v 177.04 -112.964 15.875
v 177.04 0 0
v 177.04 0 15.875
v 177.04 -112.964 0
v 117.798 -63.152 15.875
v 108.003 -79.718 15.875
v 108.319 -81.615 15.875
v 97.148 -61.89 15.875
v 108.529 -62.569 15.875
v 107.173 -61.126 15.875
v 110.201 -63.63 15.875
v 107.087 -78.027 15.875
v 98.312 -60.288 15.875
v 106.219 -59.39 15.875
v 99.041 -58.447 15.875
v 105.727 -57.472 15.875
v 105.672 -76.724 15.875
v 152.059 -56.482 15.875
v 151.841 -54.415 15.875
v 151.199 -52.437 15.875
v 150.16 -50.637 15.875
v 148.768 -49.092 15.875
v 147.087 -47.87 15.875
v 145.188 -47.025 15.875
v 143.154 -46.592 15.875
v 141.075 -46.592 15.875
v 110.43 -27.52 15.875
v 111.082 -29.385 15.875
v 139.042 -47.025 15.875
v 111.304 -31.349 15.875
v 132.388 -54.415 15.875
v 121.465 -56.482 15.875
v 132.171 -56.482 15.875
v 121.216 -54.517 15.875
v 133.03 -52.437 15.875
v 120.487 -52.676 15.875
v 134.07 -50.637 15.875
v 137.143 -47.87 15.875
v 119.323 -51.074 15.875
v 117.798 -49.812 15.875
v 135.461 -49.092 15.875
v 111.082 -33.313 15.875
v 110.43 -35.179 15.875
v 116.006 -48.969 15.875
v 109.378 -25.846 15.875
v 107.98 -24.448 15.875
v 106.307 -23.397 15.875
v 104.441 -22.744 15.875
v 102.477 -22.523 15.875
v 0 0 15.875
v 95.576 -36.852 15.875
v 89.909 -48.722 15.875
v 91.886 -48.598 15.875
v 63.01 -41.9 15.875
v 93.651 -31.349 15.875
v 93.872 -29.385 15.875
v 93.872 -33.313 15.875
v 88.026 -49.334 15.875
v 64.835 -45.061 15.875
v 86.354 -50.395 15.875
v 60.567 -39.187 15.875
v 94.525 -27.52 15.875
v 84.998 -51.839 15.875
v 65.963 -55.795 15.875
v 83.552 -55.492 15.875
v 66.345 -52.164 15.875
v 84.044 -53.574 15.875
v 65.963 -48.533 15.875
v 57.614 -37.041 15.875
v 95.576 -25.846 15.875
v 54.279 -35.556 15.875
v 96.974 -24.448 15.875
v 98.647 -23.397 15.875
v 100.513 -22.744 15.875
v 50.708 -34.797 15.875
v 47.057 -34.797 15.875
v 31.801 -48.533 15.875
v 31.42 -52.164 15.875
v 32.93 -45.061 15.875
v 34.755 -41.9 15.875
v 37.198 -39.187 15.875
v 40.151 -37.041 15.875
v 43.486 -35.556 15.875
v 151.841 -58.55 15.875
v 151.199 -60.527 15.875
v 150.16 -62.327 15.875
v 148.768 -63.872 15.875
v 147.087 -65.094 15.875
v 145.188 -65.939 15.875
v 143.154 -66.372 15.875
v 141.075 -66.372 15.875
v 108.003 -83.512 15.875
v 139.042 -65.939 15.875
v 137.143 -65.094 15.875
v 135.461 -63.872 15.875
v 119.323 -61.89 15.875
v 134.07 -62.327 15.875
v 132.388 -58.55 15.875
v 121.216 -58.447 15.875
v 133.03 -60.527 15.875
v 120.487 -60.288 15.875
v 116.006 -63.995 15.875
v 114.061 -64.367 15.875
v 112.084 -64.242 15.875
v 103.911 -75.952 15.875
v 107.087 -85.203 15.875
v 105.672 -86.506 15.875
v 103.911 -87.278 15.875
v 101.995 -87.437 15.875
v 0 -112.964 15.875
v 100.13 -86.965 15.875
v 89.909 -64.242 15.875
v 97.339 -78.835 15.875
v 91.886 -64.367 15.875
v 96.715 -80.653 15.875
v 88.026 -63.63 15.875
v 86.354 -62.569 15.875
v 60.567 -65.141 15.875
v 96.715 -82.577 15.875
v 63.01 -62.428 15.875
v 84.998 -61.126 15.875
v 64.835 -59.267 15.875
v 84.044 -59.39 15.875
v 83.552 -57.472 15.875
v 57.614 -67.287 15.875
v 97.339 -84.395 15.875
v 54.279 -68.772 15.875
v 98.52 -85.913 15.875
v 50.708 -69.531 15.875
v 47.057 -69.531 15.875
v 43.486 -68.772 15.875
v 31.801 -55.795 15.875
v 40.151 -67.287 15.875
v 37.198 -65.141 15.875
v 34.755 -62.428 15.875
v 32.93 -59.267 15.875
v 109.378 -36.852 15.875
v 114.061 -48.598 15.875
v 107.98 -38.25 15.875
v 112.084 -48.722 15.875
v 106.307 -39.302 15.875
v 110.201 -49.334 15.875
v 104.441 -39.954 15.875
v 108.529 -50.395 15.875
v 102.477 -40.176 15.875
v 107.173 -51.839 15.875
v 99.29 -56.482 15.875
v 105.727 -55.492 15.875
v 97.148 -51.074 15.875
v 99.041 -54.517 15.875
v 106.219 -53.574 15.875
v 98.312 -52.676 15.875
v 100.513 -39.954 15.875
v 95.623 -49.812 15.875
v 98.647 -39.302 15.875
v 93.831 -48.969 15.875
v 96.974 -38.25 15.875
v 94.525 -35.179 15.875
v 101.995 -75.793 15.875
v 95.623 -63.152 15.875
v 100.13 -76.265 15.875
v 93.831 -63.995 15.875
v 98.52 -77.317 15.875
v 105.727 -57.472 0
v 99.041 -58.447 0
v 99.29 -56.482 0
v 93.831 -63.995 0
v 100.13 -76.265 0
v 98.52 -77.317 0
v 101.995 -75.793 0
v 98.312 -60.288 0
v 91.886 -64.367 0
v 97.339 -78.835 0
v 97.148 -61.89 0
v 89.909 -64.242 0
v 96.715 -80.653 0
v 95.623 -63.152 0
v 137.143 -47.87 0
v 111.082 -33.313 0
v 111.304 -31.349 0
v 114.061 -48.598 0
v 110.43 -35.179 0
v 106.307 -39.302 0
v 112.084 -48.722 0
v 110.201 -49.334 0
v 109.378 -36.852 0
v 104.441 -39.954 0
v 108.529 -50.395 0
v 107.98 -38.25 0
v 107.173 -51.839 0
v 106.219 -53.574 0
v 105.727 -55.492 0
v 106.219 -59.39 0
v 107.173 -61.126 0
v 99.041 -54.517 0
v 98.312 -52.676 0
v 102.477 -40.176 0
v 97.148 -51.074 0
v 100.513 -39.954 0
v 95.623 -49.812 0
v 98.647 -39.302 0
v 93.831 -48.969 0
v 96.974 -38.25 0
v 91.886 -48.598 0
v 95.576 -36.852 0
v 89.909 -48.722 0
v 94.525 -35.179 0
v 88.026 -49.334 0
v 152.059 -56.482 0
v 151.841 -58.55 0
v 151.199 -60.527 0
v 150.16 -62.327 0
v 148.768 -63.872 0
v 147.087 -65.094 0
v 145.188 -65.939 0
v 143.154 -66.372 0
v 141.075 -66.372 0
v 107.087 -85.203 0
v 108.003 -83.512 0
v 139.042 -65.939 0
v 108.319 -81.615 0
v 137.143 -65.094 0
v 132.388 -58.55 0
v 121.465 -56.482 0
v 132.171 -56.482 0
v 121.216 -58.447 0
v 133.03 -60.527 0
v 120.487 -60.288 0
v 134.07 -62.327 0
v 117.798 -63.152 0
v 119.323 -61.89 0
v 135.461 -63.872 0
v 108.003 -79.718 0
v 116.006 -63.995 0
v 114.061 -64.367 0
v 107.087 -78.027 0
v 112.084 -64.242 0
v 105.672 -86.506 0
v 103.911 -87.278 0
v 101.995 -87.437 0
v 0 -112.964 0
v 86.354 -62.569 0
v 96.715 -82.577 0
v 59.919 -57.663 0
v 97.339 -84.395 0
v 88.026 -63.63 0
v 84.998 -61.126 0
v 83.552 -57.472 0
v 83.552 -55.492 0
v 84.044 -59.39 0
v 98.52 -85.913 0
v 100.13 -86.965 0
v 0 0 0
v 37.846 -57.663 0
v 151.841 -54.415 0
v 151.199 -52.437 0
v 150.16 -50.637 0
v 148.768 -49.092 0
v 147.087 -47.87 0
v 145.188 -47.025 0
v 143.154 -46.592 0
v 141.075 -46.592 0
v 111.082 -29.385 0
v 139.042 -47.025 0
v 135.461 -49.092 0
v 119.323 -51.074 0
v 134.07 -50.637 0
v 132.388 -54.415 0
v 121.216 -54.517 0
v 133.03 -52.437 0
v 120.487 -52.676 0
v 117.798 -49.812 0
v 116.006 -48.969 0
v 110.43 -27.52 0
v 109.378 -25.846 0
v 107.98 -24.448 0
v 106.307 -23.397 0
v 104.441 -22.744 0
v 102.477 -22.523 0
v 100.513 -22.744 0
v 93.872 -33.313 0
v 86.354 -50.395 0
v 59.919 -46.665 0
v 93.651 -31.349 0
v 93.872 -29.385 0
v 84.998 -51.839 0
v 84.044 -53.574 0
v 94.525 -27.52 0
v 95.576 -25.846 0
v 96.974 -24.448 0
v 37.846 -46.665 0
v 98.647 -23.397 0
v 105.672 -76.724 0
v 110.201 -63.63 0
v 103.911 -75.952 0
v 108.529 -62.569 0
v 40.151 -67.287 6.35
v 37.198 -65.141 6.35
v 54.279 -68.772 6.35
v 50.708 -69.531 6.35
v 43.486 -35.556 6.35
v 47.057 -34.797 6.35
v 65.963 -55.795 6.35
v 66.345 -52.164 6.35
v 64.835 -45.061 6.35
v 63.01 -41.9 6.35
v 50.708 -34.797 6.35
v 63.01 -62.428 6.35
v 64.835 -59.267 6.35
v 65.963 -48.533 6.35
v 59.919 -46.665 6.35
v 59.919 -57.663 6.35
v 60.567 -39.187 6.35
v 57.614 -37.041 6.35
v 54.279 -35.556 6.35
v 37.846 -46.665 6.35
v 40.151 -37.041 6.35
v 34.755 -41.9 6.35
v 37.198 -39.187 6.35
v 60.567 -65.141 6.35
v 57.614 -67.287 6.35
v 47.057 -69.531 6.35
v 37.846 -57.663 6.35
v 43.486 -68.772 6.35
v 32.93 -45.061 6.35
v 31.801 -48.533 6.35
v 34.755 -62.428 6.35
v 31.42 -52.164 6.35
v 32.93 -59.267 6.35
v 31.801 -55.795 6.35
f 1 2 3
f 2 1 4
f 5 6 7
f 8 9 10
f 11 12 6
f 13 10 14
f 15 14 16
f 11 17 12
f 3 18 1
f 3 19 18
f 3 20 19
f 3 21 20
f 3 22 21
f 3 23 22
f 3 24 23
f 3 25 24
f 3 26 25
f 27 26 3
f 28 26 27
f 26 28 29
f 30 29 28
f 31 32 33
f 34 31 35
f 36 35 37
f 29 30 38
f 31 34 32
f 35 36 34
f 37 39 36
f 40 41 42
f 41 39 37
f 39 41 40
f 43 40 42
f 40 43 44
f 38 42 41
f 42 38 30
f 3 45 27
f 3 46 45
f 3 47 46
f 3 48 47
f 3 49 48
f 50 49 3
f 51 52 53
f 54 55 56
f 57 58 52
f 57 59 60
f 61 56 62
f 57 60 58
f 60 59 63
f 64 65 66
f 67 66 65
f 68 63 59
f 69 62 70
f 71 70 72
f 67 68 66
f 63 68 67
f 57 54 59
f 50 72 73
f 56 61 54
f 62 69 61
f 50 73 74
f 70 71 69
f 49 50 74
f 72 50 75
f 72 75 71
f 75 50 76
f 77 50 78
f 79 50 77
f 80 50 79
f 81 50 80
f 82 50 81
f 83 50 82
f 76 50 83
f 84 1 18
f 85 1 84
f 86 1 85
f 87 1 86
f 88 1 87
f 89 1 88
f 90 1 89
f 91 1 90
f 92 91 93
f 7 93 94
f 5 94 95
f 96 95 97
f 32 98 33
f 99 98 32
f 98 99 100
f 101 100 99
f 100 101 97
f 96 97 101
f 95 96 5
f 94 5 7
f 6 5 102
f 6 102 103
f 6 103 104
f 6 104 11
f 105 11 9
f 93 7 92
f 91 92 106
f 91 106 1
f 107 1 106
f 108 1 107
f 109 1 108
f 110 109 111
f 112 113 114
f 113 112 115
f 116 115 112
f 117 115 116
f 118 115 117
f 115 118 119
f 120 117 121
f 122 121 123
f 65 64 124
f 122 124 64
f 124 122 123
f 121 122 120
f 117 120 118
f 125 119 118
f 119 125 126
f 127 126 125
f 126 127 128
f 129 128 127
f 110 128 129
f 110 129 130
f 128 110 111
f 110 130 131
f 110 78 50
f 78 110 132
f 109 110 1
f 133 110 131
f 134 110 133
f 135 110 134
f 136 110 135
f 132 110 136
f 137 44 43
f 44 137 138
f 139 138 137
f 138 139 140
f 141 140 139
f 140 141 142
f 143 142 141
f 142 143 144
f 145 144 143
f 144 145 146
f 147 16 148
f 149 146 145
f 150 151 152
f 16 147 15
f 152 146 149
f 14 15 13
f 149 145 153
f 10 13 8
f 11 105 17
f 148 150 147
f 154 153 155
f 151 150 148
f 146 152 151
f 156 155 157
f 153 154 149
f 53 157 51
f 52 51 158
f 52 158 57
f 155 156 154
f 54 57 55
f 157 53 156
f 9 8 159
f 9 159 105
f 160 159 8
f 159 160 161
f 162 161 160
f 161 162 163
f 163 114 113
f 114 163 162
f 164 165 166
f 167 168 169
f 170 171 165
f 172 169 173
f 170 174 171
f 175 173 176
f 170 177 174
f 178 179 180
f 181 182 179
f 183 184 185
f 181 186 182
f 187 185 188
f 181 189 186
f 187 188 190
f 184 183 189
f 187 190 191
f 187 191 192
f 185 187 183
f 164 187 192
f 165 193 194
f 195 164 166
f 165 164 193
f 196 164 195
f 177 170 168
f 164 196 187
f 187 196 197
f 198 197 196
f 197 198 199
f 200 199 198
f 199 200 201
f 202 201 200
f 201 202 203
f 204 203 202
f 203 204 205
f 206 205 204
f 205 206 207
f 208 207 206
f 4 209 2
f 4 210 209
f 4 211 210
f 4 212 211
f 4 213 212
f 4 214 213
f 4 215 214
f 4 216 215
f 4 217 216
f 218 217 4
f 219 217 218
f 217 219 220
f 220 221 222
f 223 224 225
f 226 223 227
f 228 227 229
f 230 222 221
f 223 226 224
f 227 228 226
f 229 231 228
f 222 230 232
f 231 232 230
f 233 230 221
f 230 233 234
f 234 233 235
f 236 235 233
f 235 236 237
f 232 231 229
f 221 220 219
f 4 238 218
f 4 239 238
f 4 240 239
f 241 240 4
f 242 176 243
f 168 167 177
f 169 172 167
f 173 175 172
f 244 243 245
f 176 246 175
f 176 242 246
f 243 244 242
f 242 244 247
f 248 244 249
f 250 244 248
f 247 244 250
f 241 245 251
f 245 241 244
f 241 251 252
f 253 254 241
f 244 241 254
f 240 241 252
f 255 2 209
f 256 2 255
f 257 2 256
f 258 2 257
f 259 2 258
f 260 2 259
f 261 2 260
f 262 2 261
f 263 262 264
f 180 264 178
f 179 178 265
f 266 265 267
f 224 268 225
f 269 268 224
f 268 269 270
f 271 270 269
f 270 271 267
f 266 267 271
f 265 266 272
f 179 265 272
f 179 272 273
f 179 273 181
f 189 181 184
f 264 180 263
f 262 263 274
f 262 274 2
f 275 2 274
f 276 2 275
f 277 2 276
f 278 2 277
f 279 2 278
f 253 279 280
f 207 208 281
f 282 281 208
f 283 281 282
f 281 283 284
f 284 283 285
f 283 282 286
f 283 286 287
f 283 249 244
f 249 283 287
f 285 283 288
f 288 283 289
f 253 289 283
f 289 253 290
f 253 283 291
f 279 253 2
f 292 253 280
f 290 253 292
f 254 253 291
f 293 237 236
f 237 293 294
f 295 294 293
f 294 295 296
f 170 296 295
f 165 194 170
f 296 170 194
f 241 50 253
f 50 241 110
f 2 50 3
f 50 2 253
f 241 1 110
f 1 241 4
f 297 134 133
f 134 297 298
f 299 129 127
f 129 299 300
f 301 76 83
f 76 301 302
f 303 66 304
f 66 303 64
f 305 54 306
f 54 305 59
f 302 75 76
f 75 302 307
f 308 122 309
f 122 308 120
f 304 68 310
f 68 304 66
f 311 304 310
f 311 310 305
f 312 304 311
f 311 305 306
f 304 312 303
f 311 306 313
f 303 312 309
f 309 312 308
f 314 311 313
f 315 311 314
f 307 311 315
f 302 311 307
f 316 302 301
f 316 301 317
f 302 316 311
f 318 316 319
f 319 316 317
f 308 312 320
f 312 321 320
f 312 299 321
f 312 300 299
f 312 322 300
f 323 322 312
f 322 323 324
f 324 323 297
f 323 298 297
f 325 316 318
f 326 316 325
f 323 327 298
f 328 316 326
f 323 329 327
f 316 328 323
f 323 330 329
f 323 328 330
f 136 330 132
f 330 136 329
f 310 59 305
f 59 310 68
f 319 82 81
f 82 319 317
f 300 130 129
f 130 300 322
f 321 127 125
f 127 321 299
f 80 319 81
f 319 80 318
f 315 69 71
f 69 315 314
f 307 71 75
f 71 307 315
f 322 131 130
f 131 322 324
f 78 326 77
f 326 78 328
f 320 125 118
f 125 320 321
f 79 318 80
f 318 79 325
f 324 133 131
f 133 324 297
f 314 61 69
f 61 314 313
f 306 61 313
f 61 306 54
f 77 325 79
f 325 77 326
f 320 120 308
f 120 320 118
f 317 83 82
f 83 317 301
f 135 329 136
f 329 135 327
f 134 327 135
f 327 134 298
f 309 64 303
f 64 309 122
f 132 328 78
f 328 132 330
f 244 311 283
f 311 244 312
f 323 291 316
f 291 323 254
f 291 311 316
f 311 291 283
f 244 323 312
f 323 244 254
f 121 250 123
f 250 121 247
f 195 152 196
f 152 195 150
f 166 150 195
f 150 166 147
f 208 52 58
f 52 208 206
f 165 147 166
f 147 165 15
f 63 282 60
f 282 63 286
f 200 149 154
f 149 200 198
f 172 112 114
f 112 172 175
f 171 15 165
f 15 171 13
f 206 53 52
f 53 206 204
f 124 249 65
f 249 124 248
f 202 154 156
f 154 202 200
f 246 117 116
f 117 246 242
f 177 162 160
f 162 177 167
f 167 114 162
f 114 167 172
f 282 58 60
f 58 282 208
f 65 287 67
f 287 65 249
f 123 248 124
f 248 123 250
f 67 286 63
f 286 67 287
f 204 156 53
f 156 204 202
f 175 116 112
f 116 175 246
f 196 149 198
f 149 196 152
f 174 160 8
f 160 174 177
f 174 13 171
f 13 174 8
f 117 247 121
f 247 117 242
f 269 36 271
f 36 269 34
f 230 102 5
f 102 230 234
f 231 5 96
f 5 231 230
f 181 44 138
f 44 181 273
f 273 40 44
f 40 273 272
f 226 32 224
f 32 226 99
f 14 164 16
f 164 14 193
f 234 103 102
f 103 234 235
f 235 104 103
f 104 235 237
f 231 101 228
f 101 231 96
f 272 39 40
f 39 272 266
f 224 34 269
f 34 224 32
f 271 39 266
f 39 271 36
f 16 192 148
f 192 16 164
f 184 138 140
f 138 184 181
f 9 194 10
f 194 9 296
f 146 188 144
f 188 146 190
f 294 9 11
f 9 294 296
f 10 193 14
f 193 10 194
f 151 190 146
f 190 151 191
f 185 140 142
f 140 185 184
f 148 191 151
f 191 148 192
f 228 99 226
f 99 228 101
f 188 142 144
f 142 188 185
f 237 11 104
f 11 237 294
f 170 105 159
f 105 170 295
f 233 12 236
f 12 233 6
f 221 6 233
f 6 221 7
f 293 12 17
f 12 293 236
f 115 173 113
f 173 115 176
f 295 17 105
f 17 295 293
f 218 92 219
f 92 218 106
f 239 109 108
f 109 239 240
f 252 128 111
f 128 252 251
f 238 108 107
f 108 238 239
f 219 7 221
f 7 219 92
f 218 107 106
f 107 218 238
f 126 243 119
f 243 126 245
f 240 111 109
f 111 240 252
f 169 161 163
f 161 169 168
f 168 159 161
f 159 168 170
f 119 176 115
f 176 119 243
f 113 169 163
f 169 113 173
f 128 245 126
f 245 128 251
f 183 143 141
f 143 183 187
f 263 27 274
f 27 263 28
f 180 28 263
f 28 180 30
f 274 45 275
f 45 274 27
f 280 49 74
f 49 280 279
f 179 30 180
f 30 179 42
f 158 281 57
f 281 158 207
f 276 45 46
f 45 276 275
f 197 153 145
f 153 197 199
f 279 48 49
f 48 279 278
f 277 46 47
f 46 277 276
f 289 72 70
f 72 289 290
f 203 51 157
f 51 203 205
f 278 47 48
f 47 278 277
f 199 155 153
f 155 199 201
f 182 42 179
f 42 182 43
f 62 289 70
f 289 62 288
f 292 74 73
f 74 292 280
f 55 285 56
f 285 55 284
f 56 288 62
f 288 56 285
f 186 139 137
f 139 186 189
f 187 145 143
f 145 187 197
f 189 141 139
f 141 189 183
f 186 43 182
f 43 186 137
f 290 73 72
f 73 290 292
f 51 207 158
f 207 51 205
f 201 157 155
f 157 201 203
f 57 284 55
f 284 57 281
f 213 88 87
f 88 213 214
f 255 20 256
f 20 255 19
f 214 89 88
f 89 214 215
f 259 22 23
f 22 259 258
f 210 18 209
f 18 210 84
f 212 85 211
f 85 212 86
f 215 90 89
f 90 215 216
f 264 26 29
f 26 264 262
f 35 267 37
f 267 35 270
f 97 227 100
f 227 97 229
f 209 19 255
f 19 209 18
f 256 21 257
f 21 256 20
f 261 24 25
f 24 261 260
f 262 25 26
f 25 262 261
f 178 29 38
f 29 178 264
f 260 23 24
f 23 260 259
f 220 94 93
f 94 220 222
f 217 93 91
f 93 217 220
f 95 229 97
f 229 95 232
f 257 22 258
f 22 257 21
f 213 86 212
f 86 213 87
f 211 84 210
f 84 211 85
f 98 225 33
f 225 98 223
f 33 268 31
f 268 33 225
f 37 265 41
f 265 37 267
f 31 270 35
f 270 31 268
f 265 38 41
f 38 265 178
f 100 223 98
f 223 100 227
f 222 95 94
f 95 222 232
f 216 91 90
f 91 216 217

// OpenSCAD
inch = 25.4;
oak_thickness = 5/8*inch;
component_gutter = 1/8*inch;

control_board_width = 2.349*inch;
control_board_height = 2.727*inch;
control_board_thickness = 0.068*inch;
segment_distance_from_top = 0.977*inch;
segment_height = 0.433*inch;
segment_gutter = 0.01*inch;
segment_width = (0.869*inch - 2*segment_gutter)/3;
segment_depth = 0.195*inch;

button_diameter = 19;
button_hole_diameter = 15.8;
iron_bracket_width = 1.25*inch;

top_angle = 10;
top_angle_adjust = oak_thickness * tan(top_angle);
top_width = 
  oak_thickness +
  component_gutter +
  control_board_width +
  component_gutter +
  button_diameter +
  component_gutter +
  button_diameter +
  component_gutter +
  iron_bracket_width +
  component_gutter +
  oak_thickness;
top_height =
  top_angle_adjust +
  oak_thickness +
  component_gutter +
  control_board_height +
  component_gutter +
  oak_thickness +
  top_angle_adjust;

component_x = function(grid_pos)
  let (
    x_offset = oak_thickness +
      component_gutter +
      control_board_width +
      component_gutter +
      button_diameter/2,
    x_spacing = button_diameter + component_gutter
  )
  x_offset + grid_pos * x_spacing;
component_y = function(grid_pos)
  let (
    y_offset = -(top_angle_adjust + oak_thickness + component_gutter +  button_diameter/2),
    y_space = control_board_height - button_diameter,
    y_spacing = -y_space / 2
  )
  y_offset + grid_pos * y_spacing; 

up_button_position    = [component_x(  0), component_y(1), 0];
enter_button_position = [component_x(  1), component_y(1), 0];
power_switch_position = [component_x(0.5), component_y(2), 0];
iron_plug_position    = [component_x(0.5), component_y(0), 0];

iron_position = [
  top_width - oak_thickness - component_gutter - iron_bracket_width/2,
  component_y(1),
  0
];

// reference: upper, left corner at 0,0
module control_board() {
  screw_hole_diameter = 0.125*inch;
  top_screw_hole_distance = 0.275*inch;
  bottom_screw_hole_distance = 0.1565*inch;
  side_screw_hole_distance = 0.3925*inch;
  
  module segment_display() {
    cube([segment_width, segment_height, segment_depth],center=true);
  }
  translate([
      +control_board_width/2,
      -control_board_height/2,
      -control_board_thickness/2 - segment_depth
  ]) {
    difference() {
      union() {
        color("green")
          cube([control_board_width,control_board_height,control_board_thickness], center=true);
        color("white")
          translate([0,
                    +control_board_height/2 - segment_height/2 - segment_distance_from_top,
                    control_board_thickness/2+segment_depth/2
          ]) {
            translate([-segment_width-segment_gutter,0,0]) segment_display();
            segment_display();
            translate([+segment_width+segment_gutter,0,0]) segment_display();
          }
      }
      translate([0,+control_board_height/2-top_screw_hole_distance,0])
        cylinder(control_board_thickness*2, d=screw_hole_diameter, center=true, $fn=10);
      translate([+control_board_width/2-side_screw_hole_distance,-control_board_height/2+bottom_screw_hole_distance,0])
        cylinder(control_board_thickness*2, d=screw_hole_diameter, center=true, $fn=10);
      translate([-control_board_width/2+side_screw_hole_distance,-control_board_height/2+bottom_screw_hole_distance,0])
        cylinder(control_board_thickness*2, d=screw_hole_diameter, center=true, $fn=10);
    }
  }
}

module button() {
  $fn=35;
  translate([0,0,oak_thickness - 3]) {
    cylinder(11.2, d=12.7);
    cylinder(7, d=button_hole_diameter);
    translate([0,0,3]) cylinder(3, d=button_diameter);
    translate([0,0,-21]) cylinder(21, d=button_diameter);
  }
}


module power_switch() {
  $fn=30;
  shaft_diameter = 0.4565*inch;
  shaft_height = 0.327*inch;
  ring_diameter = 0.588*inch;
  ring_thickness = 0.0855*inch;
  ring_position = 0.21*inch;
  
  translate ([0,0,oak_thickness - ring_position]) {
    difference() {
      cylinder(shaft_height, d=shaft_diameter);
      translate([0,0,-0.05]) cylinder(shaft_height+0.1, d=0.2435*inch);
    }
    translate([0,0,ring_position])
      difference() {
        cylinder(ring_thickness, d=ring_diameter);
        translate([0,0,-0.1]) cylinder(ring_thickness+0.2, d=shaft_diameter+0.1);
      }
  }
}

plug_shaft_diameter = 0.695*inch;
plug_shaft_height = 0.447*inch;
plug_flange_thickness = 2;
plug_key_thickness = 3;
plug_latch_thickness = 5;
module iron_plug() {
  translate([0,0,oak_thickness-plug_shaft_height/2]) cylinder(plug_shaft_height, d=plug_shaft_diameter, center=true);
  translate([0,0,oak_thickness+plug_flange_thickness/2]) cylinder(plug_flange_thickness, d=21.75, center=true);
}

iron_hole_diameter=0.783*inch;
module iron() {
  translate([0,0,oak_thickness]) {
    translate([0,0,3.97*inch/2]) cylinder(3.97*inch, d=0.518*inch, center=true);
    translate([0,0,1.8*inch/2]) cylinder(1.8*inch, d=0.786*inch, center=true);
    translate([0,0,0.4*inch/2]) cylinder(0.4*inch, d=0.9*inch, center=true);

    translate([0,0,-0.39*inch/2]) cylinder(0.39*inch, d=0.782*inch, center=true);
    translate([0,0,-0.97*inch/2]) cylinder(0.97*inch, d=0.512*inch, center=true);
    translate([0,0,-2.66*inch/2]) cylinder(2.66*inch, d=0.304*inch, center=true);
    translate([0,0,-2.66*inch - 0.58*inch/2]) cylinder(0.58*inch, d2=0.2*inch, d1=0.01*inch, center=true);
  }
}

module components() {
  translate([
    oak_thickness + component_gutter,
    -oak_thickness - component_gutter - top_angle_adjust,
    -0.2*inch
  ]) control_board();
  translate(up_button_position) button();
  translate(enter_button_position) button();
  translate(power_switch_position) power_switch();
  translate(iron_plug_position) iron_plug();
  translate(iron_position) iron();
}

viewport_diameter = (1+3/8)*inch;
viewport_floor_thickness = 1/4*inch;
viewport_through_width = segment_width*3 + 2*segment_gutter;

echo("top dimensions: ", top_width/inch, "x", top_height/inch);

module top() {
  module hole(position, diameter) {
    translate(position)
    translate([0,0,+oak_thickness/2])
    cylinder(oak_thickness+0.2, d=diameter, center=true);
  }

  viewport_x = oak_thickness + component_gutter + control_board_width/2;
  viewport_y = -top_angle_adjust -oak_thickness - component_gutter -segment_distance_from_top -segment_height/2;

  color("brown")
    difference() {
      translate([
        +top_width/2,
        -top_height/2,
        +oak_thickness/2
      ])
      cube([top_width,top_height,oak_thickness], center=true);
      
      translate([viewport_x, viewport_y, oak_thickness/2+viewport_floor_thickness])
        cylinder(oak_thickness, d=viewport_diameter, center=true);
      translate([viewport_x, viewport_y, 0])
        cube([viewport_through_width, segment_height,viewport_floor_thickness*2+0.1], center=true);
        
      hole(up_button_position, button_hole_diameter);
      hole(enter_button_position, button_hole_diameter);
      hole(power_switch_position, 0.46*inch);
      hole(iron_plug_position, plug_shaft_diameter);
      hole(iron_position, iron_hole_diameter);
    }
}

//components();
top();
